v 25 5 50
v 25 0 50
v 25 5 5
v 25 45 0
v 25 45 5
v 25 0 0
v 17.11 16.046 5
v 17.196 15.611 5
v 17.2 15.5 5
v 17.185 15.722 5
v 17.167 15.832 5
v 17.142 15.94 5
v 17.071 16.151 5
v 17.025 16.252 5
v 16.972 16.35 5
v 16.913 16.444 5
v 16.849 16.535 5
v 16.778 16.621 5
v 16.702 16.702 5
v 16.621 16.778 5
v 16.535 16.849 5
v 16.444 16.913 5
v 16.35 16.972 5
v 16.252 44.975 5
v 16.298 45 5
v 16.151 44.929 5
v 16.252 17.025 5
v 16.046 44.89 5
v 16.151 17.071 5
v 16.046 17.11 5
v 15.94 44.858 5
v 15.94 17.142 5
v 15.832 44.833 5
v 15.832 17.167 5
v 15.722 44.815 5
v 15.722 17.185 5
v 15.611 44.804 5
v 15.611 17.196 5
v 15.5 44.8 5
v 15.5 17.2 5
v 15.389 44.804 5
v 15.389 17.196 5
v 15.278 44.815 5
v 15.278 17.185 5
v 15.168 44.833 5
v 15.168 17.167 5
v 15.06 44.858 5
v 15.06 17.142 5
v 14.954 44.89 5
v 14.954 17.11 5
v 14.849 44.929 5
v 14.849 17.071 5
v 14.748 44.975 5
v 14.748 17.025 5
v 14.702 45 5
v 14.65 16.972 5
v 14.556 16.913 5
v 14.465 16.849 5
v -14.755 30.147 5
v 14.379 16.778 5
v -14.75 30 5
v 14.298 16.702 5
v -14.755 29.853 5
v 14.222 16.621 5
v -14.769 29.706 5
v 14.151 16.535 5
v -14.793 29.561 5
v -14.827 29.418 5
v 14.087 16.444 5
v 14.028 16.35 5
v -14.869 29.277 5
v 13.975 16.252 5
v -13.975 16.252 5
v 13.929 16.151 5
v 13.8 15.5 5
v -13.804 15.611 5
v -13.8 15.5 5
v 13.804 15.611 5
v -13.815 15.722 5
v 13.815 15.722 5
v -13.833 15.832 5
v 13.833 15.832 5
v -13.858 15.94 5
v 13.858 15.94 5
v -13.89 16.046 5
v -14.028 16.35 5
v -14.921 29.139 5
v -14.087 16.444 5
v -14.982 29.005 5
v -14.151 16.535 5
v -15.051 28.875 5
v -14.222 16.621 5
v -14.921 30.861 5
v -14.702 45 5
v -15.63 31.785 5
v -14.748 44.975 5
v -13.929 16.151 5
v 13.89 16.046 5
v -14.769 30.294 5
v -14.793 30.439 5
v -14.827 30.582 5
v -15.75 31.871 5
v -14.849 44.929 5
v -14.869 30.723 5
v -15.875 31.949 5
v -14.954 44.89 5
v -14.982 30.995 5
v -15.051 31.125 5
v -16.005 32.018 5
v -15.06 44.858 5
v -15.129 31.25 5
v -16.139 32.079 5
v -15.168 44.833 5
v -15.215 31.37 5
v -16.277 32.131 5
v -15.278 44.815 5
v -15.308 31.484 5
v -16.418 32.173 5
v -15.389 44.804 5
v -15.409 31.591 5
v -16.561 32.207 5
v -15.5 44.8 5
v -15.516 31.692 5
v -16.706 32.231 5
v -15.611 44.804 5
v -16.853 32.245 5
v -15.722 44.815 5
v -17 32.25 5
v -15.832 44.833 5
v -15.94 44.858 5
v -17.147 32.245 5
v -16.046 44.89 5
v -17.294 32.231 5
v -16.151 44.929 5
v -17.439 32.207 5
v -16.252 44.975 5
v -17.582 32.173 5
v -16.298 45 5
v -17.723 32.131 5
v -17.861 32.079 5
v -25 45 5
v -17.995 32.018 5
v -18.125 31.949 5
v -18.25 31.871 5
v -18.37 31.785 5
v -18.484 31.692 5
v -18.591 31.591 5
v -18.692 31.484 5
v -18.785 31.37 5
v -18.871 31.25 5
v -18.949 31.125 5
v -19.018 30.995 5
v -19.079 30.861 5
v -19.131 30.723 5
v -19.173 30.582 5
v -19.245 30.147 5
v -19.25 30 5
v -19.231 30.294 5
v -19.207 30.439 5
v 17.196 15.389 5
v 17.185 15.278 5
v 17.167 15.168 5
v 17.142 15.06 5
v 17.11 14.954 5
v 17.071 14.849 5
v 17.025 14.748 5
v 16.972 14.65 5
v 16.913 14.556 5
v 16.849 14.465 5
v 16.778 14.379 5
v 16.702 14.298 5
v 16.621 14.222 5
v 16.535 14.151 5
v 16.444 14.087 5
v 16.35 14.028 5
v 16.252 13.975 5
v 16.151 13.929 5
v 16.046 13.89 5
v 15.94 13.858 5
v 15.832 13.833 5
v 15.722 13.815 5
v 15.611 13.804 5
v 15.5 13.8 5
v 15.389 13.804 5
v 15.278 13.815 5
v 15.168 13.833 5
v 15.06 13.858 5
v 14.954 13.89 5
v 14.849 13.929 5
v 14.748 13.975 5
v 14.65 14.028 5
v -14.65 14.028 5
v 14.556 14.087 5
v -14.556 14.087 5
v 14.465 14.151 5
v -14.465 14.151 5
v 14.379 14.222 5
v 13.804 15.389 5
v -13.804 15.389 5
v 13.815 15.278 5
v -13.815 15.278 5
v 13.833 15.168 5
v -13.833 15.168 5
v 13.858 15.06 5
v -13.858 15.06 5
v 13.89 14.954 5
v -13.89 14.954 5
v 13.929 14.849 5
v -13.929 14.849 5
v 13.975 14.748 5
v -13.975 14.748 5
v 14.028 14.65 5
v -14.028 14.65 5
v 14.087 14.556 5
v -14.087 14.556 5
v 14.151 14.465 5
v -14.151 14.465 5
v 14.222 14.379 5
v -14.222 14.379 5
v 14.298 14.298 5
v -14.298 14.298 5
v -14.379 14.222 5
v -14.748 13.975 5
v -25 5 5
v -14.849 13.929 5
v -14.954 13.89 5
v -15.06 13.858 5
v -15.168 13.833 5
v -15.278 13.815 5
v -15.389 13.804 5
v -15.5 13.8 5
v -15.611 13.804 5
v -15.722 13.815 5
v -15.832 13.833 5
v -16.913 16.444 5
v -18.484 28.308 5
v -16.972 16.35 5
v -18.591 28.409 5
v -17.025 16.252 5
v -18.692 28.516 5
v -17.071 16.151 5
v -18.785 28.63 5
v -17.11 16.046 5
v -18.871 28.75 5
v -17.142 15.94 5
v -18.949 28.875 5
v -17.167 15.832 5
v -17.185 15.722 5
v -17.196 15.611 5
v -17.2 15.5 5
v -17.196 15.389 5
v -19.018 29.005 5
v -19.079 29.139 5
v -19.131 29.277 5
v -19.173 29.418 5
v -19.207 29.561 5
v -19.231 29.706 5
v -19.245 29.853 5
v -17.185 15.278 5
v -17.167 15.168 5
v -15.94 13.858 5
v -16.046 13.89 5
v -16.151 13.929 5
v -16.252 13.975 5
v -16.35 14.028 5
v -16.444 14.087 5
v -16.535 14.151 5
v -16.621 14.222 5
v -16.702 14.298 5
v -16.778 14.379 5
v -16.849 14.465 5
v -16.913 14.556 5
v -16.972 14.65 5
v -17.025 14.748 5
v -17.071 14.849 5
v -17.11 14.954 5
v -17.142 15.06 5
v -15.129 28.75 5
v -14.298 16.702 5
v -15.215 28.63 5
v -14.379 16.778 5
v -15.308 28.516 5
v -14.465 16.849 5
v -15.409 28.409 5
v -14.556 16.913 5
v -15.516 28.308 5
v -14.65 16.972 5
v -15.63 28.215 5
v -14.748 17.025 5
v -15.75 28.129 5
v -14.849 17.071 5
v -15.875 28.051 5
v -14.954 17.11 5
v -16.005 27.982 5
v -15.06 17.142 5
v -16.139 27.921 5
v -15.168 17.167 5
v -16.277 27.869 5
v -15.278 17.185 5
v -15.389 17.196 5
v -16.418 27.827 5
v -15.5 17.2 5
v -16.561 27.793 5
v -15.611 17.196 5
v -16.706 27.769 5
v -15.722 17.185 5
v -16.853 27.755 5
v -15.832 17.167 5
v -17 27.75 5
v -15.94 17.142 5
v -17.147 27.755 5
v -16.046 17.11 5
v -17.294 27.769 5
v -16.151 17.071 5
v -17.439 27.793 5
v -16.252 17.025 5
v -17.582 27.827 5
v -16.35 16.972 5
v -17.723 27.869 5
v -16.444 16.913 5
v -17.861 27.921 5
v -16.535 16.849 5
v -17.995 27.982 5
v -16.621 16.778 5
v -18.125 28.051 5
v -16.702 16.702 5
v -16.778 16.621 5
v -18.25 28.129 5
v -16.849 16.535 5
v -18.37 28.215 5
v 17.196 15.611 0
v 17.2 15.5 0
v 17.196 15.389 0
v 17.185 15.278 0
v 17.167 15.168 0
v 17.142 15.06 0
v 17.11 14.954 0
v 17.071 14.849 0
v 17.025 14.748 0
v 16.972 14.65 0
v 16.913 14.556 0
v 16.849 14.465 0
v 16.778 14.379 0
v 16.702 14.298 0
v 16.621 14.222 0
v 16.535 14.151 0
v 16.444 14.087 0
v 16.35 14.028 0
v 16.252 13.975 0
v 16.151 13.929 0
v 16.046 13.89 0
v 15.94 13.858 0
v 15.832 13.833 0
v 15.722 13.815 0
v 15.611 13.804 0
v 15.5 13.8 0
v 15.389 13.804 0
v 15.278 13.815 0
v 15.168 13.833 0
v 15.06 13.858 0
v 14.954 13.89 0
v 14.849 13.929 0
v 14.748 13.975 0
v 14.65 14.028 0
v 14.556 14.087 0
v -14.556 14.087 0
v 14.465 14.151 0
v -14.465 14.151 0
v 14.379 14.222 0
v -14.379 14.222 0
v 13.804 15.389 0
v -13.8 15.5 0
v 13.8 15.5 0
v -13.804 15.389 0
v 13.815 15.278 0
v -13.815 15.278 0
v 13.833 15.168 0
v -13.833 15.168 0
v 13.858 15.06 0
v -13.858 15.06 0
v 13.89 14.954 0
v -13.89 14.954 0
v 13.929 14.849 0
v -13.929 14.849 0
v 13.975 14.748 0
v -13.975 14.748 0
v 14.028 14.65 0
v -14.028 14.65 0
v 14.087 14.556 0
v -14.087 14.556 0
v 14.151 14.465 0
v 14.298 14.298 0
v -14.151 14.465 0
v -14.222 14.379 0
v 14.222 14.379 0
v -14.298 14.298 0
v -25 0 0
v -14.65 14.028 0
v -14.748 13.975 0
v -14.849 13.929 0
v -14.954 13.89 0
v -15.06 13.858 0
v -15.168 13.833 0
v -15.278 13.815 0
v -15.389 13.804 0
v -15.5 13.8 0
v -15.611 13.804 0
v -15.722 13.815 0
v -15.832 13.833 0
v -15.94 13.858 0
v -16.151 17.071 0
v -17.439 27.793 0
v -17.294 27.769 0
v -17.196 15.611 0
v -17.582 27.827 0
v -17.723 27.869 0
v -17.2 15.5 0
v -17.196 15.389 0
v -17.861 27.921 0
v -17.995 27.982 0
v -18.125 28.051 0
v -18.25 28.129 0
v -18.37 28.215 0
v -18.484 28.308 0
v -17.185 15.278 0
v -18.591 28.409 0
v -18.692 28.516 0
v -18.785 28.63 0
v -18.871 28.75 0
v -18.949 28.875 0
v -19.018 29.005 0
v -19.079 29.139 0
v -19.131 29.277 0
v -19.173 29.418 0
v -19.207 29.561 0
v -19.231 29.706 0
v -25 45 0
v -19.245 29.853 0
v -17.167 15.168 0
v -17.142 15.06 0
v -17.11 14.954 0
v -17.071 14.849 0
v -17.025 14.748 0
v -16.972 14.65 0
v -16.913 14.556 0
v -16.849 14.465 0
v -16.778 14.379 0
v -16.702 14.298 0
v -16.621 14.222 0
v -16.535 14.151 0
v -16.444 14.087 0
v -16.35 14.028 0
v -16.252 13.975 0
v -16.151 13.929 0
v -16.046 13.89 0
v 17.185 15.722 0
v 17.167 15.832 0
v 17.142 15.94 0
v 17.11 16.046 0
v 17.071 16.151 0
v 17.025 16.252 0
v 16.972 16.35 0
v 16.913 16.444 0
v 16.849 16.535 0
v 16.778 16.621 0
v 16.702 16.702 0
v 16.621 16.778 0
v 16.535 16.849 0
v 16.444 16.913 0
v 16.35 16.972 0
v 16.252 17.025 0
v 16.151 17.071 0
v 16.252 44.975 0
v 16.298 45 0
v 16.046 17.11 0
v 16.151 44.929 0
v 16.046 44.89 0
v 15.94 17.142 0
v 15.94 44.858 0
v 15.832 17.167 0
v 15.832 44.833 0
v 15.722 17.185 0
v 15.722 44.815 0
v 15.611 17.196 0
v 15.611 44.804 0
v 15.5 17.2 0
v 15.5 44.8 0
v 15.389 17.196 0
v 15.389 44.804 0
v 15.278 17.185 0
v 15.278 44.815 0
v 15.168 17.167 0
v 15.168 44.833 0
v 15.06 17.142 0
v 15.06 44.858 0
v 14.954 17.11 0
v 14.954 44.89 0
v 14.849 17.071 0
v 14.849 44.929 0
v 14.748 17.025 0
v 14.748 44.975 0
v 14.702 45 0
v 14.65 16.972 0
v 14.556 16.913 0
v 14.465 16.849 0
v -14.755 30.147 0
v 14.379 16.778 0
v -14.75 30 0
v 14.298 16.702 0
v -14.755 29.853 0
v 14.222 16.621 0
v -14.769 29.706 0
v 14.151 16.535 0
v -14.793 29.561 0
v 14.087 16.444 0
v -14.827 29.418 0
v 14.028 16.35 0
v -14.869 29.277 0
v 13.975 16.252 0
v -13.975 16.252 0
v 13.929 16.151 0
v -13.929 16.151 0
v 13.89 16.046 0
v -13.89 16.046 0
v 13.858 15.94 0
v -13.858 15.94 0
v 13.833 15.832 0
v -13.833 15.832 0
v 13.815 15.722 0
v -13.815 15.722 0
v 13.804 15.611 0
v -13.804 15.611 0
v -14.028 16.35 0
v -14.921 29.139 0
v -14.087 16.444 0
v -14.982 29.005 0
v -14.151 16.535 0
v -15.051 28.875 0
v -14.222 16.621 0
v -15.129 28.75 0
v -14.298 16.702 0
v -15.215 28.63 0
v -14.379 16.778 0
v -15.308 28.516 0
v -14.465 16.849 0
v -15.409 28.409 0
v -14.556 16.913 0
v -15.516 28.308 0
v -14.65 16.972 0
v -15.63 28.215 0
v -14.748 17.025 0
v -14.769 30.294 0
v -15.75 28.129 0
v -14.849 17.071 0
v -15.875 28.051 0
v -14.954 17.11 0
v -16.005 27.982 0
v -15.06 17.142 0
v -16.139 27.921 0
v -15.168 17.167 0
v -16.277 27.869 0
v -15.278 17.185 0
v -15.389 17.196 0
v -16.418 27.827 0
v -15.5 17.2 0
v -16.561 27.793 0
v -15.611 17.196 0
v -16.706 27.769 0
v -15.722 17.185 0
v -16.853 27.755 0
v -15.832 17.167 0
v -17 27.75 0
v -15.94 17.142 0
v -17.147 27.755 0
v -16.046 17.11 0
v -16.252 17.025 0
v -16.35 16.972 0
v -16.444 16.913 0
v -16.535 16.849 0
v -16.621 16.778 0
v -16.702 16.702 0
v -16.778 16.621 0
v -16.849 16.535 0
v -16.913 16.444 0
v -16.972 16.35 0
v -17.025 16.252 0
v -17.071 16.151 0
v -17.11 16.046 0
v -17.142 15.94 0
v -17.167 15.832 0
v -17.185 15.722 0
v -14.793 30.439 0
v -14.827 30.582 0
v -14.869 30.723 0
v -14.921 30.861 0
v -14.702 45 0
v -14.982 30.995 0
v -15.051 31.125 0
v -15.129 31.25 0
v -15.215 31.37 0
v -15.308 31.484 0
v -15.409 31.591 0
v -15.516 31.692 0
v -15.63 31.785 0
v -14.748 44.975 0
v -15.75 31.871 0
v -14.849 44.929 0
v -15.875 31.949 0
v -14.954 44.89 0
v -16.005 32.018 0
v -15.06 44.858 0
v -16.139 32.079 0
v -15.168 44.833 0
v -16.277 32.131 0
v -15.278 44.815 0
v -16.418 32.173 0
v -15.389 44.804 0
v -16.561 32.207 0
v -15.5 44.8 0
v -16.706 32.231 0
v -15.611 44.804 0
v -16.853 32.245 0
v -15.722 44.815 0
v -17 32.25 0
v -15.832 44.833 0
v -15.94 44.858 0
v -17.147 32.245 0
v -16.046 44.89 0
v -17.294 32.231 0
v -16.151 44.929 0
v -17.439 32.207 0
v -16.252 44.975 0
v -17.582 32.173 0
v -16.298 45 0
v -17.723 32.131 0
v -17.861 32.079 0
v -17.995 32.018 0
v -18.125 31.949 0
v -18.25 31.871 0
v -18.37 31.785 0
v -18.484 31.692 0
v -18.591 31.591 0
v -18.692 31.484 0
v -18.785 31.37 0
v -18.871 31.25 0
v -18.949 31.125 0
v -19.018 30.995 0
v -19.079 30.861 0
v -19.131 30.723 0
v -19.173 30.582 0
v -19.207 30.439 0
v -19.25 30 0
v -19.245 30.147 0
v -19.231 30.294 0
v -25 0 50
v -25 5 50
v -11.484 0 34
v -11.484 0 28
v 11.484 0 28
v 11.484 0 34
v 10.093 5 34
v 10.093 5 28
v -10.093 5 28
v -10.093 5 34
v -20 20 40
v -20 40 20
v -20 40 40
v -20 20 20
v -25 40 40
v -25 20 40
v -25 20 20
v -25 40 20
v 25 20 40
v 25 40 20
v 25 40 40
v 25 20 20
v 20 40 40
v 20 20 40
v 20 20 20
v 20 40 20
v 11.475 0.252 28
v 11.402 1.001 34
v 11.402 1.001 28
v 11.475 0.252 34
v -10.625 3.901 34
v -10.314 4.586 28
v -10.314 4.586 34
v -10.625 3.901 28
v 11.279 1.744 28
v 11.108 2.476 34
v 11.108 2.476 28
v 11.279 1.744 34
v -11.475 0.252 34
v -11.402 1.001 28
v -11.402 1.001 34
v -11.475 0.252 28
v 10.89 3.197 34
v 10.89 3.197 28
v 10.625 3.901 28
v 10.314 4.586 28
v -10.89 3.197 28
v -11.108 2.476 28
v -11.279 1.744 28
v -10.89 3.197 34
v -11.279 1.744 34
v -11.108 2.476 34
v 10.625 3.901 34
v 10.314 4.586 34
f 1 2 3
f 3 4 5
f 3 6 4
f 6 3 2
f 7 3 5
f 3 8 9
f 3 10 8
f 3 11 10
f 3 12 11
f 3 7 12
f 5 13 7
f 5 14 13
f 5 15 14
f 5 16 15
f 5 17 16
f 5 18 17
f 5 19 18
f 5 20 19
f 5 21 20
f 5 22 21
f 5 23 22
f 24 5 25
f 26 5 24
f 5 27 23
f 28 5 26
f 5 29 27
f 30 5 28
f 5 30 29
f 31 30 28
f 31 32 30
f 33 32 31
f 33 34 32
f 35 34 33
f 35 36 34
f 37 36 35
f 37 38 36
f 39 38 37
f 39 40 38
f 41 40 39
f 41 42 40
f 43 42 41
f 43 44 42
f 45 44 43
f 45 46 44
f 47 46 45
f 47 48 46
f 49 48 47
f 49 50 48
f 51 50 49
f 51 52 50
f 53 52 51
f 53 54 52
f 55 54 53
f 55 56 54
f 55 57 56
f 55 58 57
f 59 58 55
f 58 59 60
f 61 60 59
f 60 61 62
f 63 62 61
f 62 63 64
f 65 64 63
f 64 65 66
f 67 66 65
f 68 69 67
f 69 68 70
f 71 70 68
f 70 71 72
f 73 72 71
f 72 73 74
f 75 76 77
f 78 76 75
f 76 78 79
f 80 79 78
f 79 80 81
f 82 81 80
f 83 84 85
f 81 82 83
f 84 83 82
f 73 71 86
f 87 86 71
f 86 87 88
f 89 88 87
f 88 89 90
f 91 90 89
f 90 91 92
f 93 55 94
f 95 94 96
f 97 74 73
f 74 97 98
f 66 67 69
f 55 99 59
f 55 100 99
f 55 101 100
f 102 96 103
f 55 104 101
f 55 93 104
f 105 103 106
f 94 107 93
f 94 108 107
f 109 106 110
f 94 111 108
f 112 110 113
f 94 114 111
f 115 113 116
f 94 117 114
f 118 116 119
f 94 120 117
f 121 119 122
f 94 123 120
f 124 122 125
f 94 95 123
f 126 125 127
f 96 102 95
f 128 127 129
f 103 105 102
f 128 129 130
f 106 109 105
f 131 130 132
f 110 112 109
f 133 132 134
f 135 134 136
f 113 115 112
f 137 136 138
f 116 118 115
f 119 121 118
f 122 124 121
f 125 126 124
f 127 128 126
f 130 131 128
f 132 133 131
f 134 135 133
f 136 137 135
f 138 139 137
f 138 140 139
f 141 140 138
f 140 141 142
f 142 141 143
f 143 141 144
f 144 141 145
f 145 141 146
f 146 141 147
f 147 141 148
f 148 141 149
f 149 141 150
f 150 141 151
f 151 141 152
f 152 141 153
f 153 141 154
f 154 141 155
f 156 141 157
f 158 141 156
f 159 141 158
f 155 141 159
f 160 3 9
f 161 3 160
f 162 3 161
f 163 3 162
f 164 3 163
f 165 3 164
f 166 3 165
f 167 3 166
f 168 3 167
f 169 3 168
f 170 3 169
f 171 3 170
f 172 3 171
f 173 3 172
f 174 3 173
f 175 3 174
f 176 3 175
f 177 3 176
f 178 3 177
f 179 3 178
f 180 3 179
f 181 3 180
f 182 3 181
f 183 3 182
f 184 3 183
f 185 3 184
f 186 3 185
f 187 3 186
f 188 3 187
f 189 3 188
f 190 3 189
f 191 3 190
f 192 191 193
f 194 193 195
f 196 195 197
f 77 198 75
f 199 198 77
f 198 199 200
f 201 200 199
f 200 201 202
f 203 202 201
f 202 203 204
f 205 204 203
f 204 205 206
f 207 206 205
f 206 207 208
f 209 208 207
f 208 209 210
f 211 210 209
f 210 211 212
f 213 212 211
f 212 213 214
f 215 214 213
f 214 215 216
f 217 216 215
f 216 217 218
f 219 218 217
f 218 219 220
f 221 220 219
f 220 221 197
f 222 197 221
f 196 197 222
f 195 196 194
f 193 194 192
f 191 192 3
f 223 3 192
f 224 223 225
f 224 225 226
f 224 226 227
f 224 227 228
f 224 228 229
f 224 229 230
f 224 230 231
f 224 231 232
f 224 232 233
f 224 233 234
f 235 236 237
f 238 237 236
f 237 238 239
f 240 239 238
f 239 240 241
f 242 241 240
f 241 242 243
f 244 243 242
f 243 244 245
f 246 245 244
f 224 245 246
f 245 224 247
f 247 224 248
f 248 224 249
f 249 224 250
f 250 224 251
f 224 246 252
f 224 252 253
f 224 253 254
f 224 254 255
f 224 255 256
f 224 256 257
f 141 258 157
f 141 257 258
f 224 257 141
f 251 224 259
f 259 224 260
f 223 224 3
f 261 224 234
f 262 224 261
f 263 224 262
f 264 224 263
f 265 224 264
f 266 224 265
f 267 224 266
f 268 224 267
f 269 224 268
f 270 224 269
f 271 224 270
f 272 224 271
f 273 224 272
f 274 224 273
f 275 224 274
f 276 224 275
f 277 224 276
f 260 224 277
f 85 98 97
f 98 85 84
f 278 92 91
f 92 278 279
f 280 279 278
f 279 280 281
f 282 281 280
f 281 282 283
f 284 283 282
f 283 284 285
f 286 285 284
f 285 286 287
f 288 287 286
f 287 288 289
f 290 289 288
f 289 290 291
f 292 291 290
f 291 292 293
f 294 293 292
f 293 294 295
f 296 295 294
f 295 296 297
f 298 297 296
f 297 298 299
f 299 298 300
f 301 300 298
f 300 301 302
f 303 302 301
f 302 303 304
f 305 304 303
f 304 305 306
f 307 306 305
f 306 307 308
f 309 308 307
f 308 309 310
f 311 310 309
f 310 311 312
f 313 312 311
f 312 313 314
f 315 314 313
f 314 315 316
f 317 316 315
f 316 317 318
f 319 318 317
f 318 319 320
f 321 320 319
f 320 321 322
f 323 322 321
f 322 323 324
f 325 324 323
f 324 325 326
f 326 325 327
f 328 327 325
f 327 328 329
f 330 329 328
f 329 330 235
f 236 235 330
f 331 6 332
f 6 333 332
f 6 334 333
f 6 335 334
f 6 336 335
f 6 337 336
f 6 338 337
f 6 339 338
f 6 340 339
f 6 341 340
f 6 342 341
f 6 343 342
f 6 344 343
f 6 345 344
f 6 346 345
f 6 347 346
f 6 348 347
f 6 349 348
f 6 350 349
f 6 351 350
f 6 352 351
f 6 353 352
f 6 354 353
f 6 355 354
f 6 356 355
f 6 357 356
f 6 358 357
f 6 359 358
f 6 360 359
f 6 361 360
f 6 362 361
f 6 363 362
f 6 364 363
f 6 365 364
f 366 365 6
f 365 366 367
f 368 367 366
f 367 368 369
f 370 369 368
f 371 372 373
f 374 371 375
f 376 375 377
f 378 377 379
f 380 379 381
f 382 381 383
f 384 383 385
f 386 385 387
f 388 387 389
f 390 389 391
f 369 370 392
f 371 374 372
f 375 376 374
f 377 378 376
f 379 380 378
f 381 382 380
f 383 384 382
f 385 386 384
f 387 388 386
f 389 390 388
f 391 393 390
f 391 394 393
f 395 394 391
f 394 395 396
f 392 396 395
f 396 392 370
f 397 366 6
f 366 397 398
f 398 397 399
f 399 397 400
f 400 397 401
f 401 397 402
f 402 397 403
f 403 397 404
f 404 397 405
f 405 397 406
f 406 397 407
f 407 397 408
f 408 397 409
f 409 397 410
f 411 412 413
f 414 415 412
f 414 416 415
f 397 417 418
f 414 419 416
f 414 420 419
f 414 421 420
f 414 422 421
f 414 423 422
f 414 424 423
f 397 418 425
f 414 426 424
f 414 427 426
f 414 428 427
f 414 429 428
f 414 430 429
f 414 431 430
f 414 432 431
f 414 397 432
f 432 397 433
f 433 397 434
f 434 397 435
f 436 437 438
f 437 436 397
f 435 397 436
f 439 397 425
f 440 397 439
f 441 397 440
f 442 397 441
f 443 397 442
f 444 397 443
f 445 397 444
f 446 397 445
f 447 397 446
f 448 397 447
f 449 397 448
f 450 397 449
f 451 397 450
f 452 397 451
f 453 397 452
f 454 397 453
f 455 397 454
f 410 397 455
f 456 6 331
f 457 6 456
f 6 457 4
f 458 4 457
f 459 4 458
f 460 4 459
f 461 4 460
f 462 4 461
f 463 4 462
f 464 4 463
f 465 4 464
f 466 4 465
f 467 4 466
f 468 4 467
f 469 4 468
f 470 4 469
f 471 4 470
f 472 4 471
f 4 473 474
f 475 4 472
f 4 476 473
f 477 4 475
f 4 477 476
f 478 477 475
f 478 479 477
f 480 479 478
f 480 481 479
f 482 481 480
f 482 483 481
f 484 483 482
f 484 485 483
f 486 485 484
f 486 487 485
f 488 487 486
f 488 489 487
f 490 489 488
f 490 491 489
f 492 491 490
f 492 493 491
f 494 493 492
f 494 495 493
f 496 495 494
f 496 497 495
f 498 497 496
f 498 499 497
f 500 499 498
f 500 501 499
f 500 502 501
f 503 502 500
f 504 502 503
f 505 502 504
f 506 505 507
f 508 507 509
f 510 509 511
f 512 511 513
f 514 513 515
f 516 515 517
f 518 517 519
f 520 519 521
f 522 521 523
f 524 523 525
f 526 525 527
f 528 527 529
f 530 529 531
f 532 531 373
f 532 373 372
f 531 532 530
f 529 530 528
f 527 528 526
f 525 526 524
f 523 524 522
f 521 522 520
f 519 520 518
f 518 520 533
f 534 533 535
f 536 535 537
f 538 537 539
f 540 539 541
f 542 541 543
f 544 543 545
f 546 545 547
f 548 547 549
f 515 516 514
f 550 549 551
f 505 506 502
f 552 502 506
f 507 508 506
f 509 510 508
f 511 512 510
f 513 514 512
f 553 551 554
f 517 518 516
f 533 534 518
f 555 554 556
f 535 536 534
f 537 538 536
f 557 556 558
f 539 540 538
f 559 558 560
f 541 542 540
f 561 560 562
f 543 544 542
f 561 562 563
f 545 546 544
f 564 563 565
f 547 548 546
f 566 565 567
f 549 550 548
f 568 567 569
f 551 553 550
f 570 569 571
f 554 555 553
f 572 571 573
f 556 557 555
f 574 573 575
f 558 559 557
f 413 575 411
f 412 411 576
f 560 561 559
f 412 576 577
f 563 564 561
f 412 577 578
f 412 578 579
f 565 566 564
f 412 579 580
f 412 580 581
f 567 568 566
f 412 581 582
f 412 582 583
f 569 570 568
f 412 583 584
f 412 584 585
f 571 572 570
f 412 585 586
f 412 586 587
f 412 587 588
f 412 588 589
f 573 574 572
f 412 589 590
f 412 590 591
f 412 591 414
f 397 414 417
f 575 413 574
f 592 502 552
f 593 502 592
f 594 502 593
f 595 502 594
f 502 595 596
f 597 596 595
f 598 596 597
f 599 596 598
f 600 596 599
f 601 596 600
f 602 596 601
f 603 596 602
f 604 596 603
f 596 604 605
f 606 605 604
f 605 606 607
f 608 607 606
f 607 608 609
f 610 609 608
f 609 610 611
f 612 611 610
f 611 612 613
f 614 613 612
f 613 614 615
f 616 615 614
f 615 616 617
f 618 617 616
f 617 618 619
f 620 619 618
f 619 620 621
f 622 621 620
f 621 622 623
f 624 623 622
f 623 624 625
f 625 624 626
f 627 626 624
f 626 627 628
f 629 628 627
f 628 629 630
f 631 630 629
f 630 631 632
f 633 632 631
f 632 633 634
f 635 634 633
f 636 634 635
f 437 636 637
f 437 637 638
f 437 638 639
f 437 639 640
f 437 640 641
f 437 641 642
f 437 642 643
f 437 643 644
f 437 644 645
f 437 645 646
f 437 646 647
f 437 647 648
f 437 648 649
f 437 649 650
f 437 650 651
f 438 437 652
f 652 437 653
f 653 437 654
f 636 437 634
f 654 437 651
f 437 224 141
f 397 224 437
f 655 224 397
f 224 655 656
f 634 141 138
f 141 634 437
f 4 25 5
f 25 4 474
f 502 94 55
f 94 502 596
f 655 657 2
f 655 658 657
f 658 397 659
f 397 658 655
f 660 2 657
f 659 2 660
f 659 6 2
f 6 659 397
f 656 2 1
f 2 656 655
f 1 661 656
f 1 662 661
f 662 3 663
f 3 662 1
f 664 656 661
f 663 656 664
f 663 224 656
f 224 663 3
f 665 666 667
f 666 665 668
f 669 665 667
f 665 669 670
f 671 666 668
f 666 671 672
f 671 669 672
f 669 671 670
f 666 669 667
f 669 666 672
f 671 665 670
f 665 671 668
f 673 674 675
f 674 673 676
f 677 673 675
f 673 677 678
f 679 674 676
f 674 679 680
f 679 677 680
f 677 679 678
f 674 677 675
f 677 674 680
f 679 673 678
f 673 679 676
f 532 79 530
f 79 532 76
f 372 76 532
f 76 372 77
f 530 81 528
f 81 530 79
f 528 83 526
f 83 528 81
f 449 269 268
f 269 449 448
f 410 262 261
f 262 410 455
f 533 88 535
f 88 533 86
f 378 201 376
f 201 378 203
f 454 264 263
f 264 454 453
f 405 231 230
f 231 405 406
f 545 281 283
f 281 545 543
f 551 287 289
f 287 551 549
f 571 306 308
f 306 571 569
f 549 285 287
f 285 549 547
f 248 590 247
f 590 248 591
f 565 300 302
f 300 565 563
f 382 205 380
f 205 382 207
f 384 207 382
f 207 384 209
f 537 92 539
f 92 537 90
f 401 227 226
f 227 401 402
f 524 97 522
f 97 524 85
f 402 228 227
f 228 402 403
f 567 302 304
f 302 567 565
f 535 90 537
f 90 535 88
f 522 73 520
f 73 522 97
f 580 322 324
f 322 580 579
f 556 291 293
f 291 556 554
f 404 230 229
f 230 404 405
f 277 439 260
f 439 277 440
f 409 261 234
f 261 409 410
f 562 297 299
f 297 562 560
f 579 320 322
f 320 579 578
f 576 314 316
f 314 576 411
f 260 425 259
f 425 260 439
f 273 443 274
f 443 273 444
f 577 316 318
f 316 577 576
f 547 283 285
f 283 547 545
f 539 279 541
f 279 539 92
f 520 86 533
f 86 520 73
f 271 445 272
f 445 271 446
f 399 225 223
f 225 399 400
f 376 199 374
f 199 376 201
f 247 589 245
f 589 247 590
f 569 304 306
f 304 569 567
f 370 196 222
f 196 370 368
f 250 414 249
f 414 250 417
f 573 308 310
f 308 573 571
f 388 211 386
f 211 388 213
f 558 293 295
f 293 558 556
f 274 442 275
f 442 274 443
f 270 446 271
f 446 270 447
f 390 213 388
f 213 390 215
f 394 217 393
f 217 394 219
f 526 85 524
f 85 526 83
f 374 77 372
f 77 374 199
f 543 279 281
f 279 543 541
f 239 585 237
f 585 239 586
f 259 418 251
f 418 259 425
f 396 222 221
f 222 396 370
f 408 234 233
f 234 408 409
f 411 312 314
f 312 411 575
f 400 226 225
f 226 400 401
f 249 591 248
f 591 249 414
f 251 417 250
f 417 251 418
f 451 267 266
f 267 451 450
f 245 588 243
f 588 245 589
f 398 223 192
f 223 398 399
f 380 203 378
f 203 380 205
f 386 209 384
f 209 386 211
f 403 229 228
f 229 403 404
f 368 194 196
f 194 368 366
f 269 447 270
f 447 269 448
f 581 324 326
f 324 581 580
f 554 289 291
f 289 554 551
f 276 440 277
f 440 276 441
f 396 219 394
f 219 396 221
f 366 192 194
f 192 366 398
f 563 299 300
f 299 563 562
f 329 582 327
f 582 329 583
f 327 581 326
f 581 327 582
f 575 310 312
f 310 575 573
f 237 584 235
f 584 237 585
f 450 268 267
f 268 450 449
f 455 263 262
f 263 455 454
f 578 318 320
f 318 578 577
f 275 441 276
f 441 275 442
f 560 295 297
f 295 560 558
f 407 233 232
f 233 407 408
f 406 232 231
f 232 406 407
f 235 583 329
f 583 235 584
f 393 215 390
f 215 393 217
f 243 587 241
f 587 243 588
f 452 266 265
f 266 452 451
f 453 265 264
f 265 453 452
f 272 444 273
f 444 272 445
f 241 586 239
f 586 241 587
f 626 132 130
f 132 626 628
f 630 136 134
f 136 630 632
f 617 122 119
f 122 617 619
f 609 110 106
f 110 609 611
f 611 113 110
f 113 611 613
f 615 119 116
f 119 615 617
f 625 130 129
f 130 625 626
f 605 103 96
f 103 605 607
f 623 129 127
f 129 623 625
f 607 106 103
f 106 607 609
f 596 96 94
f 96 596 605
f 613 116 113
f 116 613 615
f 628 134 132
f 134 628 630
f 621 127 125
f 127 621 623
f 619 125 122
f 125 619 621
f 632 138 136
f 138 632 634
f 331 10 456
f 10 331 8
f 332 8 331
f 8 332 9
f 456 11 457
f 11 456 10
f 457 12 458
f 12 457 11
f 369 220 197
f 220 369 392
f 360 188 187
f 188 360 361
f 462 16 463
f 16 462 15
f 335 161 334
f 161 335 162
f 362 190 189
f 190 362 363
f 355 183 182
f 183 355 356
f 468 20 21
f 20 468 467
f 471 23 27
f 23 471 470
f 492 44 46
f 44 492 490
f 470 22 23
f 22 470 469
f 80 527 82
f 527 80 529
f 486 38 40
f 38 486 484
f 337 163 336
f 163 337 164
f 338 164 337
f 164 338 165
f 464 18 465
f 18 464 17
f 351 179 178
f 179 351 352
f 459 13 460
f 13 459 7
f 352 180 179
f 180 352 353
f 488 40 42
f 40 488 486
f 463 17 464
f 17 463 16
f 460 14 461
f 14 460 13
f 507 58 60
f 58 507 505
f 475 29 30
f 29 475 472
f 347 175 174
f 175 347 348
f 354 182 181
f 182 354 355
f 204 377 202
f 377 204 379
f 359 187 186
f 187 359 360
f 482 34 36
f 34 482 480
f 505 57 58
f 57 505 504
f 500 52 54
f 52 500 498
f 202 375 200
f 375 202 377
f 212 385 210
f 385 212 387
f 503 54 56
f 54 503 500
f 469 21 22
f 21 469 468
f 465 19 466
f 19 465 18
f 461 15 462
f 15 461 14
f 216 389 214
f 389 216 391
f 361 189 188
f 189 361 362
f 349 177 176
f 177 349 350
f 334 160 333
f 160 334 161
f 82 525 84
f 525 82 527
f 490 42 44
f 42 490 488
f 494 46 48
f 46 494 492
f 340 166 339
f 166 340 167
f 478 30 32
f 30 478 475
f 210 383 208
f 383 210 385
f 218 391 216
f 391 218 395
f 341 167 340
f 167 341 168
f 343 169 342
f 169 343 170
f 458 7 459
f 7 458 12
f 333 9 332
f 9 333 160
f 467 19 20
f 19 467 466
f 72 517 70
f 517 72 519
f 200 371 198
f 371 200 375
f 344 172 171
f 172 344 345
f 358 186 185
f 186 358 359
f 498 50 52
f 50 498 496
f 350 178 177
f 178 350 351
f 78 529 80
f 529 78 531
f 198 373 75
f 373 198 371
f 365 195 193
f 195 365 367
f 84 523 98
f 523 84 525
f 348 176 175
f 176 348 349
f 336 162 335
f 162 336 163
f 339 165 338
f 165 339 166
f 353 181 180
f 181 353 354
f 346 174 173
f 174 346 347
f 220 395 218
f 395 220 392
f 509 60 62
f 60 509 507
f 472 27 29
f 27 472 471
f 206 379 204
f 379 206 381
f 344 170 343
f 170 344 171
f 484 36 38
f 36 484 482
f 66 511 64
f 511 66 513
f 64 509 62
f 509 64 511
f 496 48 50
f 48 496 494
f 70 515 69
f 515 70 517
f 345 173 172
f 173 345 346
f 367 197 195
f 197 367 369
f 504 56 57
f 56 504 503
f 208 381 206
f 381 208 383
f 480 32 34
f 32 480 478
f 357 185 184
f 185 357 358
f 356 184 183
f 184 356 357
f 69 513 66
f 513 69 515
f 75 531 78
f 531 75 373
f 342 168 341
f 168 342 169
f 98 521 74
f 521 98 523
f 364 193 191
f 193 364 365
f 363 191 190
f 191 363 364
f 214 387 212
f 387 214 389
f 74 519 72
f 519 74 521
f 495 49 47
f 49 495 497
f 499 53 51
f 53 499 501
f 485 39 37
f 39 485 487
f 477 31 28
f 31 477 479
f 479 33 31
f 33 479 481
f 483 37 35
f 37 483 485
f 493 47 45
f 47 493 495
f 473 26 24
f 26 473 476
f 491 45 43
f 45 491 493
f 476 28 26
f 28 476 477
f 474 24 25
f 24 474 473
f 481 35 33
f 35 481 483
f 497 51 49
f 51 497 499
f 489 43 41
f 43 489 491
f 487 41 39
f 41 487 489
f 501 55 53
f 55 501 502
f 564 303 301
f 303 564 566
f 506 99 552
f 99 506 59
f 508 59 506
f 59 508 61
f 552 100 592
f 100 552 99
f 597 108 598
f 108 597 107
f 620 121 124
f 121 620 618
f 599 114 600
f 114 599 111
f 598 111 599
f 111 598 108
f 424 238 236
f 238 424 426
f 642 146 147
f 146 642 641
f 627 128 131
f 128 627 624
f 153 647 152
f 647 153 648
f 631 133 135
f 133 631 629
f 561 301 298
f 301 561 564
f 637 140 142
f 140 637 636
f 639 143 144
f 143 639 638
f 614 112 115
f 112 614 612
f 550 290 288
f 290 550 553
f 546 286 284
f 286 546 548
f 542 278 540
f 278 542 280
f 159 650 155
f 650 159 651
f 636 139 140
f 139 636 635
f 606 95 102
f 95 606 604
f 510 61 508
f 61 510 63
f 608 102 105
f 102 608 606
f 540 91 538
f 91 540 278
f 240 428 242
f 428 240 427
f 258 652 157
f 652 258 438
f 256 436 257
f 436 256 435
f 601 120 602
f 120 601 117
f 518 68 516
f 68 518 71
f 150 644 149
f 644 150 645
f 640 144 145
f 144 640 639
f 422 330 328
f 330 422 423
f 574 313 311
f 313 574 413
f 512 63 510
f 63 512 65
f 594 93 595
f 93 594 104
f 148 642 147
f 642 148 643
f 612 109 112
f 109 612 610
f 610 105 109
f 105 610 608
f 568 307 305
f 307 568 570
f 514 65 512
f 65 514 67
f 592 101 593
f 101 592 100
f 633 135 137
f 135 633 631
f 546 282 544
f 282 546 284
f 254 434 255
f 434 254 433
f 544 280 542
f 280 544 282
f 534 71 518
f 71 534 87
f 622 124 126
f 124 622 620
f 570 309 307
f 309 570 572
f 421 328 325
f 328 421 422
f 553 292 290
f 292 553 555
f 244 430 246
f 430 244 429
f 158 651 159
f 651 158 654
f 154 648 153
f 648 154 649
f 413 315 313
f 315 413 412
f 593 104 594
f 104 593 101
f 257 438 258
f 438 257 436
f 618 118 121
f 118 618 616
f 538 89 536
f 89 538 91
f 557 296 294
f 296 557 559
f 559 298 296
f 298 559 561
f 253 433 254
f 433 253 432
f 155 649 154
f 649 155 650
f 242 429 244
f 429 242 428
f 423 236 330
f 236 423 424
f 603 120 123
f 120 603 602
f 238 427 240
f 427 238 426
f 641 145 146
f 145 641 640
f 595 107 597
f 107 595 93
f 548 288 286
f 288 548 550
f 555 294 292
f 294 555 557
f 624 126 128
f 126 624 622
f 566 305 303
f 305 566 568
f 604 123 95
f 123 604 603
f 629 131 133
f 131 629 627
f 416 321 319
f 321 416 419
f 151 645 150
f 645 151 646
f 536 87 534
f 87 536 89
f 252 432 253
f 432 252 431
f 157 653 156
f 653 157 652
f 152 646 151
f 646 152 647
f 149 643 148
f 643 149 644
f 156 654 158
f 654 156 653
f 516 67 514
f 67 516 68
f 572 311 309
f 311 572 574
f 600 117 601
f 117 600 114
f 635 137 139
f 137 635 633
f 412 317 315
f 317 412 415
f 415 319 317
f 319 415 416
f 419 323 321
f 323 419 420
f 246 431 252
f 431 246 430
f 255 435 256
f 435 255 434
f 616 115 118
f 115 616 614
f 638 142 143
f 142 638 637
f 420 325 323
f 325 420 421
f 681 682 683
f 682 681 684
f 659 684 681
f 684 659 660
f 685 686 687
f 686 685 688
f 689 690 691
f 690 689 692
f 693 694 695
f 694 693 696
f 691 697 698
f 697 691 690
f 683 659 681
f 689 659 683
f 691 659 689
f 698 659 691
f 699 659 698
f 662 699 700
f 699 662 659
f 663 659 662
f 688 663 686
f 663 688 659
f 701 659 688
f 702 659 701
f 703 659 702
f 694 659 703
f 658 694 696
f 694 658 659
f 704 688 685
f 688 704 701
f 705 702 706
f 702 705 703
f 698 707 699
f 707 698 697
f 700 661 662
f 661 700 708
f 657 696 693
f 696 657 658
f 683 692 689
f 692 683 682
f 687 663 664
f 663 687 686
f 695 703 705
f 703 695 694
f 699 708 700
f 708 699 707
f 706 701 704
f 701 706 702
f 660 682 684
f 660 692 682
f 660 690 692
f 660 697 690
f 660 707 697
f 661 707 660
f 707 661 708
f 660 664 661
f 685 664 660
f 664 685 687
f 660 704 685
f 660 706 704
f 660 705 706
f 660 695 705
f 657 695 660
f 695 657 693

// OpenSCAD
// L-shaped mounting bracket for NEMA 17 stepper motor
// Print orientation: base plate on bed (z = 0), motor plate builds upward (+Z)

// ---------------- Parameters ----------------
base_x0      = -25;    // base plate: x start
base_x1      = 25;     // base plate: x end
base_y0      = 0;      // base plate: y start
base_y1      = 45;     // base plate: y end
base_z1      = 5;      // base plate: z end (thickness)

hole_x       = -17;    // M4 through-hole x position
hole_y       = 30;     // M4 through-hole y position
hole_d       = 4.5;    // M4 hole diameter

plate_x0     = -25;    // motor plate: x start
plate_x1     = 25;     // motor plate: x end
plate_y0     = 0;      // motor plate: y start
plate_y1     = 5;      // motor plate: y end (thickness)
plate_z1     = 50;     // motor plate: z end (height)

boss_d       = 23;     // motor centring boss hole diameter
boss_x       = 0;      // boss hole centre x
boss_z       = 28;     // boss hole centre z

screw_d      = 3.4;    // M3 screw hole diameter
screw_pat    = 31;     // square pattern side length

gusset_t     = 5;      // gusset thickness (X)
gusset_leg   = 20;     // right triangle leg length (Y and Z)
gusset_x0    = -25;    // left gusset x start
gusset_x1    = 20;     // right gusset x end (start of right gusset)

eps          = 0.5;    // cutter overshoot past faces

$fn = 96;

// ---------------- Model ----------------
difference() {
    union() {
        // Base plate
        translate([base_x0, base_y0, 0])
            cube([base_x1 - base_x0, base_y1 - base_y0, base_z1]);

        // Motor plate
        translate([plate_x0, plate_y0, 0])
            cube([plate_x1 - plate_x0, plate_y1 - plate_y0, plate_z1]);

        // Left gusset (flush with left edge)
        translate([gusset_x0, gusset_leg, gusset_leg])
            cube([gusset_t, gusset_leg, gusset_leg]);

        // Right gusset (flush with right edge)
        translate([gusset_x1, gusset_leg, gusset_leg])
            cube([gusset_t, gusset_leg, gusset_leg]);
    }

    // M4 through-holes in base plate
    translate([hole_x, hole_y, -eps])
        cylinder(d = hole_d, h = base_z1 + 2 * eps);

    // Boss hole through motor plate (along Y)
    translate([boss_x, plate_y0 - eps, boss_z])
        cylinder(d = boss_d, h = plate_y1 + 2 * eps);

    // M3 screw holes on square pattern centred on boss hole
    for (i = [0 : 3])
        for (j = [0 : 3])
            translate([(i - 1.5) * screw_pat, (j - 1.5) * screw_pat, -eps])
                cylinder(d = screw_d, h = plate_z1 + 2 * eps);
}
